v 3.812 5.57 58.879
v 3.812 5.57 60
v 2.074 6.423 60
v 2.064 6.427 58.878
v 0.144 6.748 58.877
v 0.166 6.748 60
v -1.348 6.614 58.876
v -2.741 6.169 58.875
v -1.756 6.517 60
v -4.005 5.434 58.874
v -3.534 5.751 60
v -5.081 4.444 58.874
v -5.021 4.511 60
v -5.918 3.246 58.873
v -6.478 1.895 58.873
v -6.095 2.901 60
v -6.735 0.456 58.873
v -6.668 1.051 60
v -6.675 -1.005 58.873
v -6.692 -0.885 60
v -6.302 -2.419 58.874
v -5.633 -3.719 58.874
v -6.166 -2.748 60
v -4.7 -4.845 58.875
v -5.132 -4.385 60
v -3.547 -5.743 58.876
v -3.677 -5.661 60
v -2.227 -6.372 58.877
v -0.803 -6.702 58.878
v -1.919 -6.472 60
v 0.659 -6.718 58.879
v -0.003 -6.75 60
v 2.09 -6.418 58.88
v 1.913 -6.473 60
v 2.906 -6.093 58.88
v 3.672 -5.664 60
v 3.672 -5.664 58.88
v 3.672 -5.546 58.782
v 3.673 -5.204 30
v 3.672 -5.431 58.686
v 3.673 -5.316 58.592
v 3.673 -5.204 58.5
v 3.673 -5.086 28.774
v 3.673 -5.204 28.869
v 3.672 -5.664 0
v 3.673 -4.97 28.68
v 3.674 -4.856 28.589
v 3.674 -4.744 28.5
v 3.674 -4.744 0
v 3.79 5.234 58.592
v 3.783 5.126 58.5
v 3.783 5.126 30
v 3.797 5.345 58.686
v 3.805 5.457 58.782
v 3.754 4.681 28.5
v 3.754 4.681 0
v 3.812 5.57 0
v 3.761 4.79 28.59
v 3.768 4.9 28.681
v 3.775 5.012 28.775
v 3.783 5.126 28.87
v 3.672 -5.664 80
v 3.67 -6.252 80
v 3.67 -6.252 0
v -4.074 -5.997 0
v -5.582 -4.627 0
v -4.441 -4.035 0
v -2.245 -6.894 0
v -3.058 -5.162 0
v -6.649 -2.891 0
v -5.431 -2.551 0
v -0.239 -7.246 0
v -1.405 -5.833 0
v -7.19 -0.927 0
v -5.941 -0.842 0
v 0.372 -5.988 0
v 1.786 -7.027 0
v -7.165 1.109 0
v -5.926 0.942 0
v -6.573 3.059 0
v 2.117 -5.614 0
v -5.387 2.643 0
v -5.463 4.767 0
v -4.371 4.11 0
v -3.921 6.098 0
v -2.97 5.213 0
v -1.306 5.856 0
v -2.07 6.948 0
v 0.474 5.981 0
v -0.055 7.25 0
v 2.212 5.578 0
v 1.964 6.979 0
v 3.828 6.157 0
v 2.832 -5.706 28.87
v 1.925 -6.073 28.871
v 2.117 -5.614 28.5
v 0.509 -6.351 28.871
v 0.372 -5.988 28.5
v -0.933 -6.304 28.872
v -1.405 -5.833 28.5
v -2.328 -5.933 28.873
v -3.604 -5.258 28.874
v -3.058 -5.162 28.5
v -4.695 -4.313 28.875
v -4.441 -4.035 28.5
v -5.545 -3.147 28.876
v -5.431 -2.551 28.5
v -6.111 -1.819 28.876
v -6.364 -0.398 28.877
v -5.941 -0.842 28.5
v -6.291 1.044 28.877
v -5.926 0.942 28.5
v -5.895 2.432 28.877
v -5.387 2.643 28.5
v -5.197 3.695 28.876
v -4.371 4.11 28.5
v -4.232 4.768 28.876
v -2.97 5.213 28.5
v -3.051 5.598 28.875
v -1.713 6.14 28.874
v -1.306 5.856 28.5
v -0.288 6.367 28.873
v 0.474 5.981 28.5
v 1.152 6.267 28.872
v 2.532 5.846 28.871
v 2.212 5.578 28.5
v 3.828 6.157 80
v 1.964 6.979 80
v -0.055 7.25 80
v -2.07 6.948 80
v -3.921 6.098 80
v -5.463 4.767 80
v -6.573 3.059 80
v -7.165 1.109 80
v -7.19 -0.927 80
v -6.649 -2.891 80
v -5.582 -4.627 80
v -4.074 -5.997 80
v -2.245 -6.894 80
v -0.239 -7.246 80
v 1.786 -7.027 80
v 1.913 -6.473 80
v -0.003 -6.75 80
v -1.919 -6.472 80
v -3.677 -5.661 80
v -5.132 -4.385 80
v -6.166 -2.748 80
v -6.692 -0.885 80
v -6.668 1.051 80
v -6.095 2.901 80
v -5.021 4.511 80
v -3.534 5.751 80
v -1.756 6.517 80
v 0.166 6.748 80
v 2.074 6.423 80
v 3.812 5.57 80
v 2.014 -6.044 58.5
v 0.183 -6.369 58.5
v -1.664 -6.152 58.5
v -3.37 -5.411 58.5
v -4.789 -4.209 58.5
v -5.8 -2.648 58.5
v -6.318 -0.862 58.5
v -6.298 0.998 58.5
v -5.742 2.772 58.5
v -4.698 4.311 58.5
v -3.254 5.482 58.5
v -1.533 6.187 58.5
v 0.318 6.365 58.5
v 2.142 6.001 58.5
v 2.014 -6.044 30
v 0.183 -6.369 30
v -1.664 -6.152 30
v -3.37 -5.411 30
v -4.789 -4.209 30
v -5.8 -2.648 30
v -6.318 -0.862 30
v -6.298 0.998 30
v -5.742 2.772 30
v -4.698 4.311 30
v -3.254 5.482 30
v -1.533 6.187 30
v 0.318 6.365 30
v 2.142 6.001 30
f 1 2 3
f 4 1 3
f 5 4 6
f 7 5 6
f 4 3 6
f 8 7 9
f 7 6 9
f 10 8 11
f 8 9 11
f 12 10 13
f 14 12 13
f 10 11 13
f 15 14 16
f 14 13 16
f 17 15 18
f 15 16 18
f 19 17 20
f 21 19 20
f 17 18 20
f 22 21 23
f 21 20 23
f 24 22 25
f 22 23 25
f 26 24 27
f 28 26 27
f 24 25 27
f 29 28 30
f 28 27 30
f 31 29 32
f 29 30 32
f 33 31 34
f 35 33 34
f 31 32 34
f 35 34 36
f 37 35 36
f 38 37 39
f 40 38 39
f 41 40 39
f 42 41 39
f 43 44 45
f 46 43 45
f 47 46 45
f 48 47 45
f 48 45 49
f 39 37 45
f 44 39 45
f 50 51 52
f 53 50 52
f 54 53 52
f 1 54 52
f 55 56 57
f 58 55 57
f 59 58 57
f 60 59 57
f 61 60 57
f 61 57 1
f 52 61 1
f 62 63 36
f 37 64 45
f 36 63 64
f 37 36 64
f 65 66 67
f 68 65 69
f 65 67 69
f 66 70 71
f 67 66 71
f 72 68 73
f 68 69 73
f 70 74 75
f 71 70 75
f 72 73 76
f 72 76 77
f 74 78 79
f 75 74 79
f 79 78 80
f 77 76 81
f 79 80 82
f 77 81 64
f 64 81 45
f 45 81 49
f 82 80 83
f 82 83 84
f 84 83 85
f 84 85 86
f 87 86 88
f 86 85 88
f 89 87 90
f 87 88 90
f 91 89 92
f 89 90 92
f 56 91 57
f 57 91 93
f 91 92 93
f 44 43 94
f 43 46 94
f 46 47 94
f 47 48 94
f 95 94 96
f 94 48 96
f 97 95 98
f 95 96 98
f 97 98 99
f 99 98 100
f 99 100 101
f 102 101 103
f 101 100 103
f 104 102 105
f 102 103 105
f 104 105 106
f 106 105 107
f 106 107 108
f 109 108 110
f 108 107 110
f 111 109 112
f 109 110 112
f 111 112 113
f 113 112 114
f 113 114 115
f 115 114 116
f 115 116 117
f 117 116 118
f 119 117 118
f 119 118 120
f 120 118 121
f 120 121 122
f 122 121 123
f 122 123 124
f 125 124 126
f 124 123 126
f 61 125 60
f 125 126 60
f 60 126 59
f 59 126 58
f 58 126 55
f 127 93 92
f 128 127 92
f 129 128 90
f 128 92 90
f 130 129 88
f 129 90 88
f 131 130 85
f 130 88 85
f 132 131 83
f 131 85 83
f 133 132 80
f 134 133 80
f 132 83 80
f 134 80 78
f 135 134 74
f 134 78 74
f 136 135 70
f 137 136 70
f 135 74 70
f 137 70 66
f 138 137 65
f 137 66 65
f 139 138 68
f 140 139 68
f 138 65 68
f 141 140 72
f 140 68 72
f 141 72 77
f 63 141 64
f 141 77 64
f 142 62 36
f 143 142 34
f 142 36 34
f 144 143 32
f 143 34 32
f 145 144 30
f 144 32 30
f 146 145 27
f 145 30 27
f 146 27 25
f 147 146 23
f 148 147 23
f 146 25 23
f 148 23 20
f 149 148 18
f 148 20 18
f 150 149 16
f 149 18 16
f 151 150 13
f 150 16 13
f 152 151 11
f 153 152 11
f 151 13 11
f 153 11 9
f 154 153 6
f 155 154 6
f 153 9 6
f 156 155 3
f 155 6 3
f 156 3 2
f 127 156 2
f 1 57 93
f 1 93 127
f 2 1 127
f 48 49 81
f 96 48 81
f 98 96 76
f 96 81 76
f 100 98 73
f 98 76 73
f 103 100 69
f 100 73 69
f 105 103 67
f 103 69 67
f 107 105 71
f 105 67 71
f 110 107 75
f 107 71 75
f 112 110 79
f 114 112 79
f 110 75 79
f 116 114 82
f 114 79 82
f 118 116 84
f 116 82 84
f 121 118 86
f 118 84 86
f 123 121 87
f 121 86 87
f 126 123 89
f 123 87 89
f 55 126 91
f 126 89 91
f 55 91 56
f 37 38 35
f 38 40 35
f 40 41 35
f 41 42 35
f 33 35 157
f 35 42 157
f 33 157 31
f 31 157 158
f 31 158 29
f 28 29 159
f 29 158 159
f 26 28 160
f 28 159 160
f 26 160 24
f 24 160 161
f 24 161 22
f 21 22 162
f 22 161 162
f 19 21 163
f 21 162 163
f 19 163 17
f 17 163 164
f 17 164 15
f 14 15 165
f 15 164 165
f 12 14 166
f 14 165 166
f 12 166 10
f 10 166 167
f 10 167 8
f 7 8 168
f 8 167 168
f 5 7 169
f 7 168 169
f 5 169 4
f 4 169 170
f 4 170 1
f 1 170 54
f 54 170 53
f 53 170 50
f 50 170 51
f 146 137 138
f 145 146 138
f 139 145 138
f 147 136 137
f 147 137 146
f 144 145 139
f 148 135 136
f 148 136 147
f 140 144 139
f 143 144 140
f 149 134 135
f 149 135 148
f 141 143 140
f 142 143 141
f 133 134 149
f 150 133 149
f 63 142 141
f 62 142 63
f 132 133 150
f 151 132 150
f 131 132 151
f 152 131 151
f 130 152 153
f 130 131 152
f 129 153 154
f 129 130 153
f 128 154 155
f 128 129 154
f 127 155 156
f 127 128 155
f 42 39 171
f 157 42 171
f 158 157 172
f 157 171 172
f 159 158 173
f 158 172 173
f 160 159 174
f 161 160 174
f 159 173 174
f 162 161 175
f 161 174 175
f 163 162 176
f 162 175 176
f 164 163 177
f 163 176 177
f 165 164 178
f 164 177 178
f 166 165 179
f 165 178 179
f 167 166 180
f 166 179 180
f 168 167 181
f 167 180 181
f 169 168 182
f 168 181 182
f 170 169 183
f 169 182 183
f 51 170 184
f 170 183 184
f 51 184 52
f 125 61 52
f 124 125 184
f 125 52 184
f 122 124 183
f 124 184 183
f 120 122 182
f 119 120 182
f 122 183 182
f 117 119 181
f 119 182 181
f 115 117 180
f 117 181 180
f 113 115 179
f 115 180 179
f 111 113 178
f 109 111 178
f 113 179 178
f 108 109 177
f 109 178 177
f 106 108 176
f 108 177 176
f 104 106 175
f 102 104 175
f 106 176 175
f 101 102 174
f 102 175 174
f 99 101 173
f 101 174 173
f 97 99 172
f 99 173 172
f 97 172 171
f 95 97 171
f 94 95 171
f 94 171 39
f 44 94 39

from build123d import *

# Parameters (mm, degrees)
F1_DEPTH     = 80
F2_DEPTH     = 60
F3_DEPTH     = 30
F4_T4_ANGLE  = 321.2915133738
F4_S5_R      = 6.75
F4_T6_DEPTH  = 13
F4_T10_ANGLE = 330.397154177
F4_S11_R     = 6.3724602388
F4_T12_DEPTH = 12


# Not quite as in the source:
# - a fillet or chamfer that OpenCascade refuses, or shapes differently, is made with other operations: its cross-section is extruded or revolved along the edge and cut away or added


with BuildPart() as f1:
    # F0 (on Top) → F1 (new body)
    with BuildSketch(Plane.XY):
        with BuildLine():
            ThreePointArc((3.6719317522, -5.6638694553), (-6.7494746232, 0.0842158591), (3.8121072666, 5.5704881463))
            Line((3.8121072666, 5.5704881463), (3.8276649179, 6.1572300003))
            ThreePointArc((3.8276649179, 6.1572300003), (-7.2494177613, 0.091881022), (3.6703837587, -6.2522622357))
            Line((3.6703837587, -6.2522622357), (3.6719317522, -5.6638694553))
        make_face()
    extrude(amount=F1_DEPTH)

    # F0 (on Top) → F2 (join)
    with BuildSketch(Plane.XY):
        with BuildLine():
            Line((3.7829003883, 5.1256385395), (3.8121072666, 5.5704881463))
            ThreePointArc((3.8121072666, 5.5704881463), (-6.7494746232, 0.0842158591), (3.6719317522, -5.6638694553))
            Line((3.6719317522, -5.6638694553), (3.6728513037, -5.2038225677))
            ThreePointArc((3.6728513037, -5.2038225677), (-6.3764069894, 0.0685580429), (3.7829003883, 5.1256385395))
        make_face()
    extrude(amount=F2_DEPTH)

    # F0 (on Top) → F3 (join)
    with BuildSketch(Plane.XY):
        with BuildLine():
            Line((3.75369351, 4.6807889327), (3.7829003883, 5.1256385395))
            ThreePointArc((3.7829003883, 5.1256385395), (-6.3764069894, 0.0685580429), (3.6728513037, -5.2038225677))
            Line((3.6728513037, -5.2038225677), (3.6737708552, -4.7437756801))
            ThreePointArc((3.6737708552, -4.7437756801), (-5.9997842678, 0.0508796647), (3.75369351, 4.6807889327))
        make_face()
    extrude(amount=F3_DEPTH)

    # F4: chamfer of 1.5 on 2 edges, made by hand


with BuildPart() as f4_tool2:
    # F4_s3 → F4_t4 (revolve)
    with BuildSketch(Plane(origin=(-0.0002871576, -0.0007904765, 0), x_dir=(0, 0, 1), z_dir=(0.341440213, 0.9399034955, 0))):
        Polygon((60, 7.8681819087), (58.5, 6.3681819087), (60, 6.3681819087), align=None)
    revolve(axis=Axis((-0.004308375, 0.0006703174, 60), (0, 0, -1)), revolution_arc=F4_T4_ANGLE)

    # F4_s5 → F4_t6 (intersect, symmetric)
    with BuildSketch(Plane.XY.offset(59.2)):
        Circle(F4_S5_R)
    extrude(amount=F4_T6_DEPTH, both=True, mode=Mode.INTERSECT)


with BuildPart() as f1_1:
    add(f1.part)

    # F4_t1: cut F4_tool2
    add(f4_tool2.part, mode=Mode.SUBTRACT)


with BuildPart() as f4_tool8:
    # F4_s9 → F4_t10 (revolve)
    with BuildSketch(Plane(origin=(0, 0, 0), x_dir=(0, 0, 1), z_dir=(0.2636591374, 0.9646159128, 0))):
        Polygon((30, 7.5), (28.5, 6), (30, 6), align=None)
    revolve(axis=Axis((0, 0, 30), (0, 0, -1)), revolution_arc=F4_T10_ANGLE)

    # F4_s11 → F4_t12 (intersect, symmetric)
    with BuildSketch(Plane.XY.offset(29.2)):
        with Locations((-0.004308375, 0.0006703174)):
            Circle(F4_S11_R)
    extrude(amount=F4_T12_DEPTH, both=True, mode=Mode.INTERSECT)


with BuildPart() as f1_2:
    add(f1_1.part)

    # F4_t7: cut F4_tool8
    add(f4_tool8.part, mode=Mode.SUBTRACT)


solid = f1_2.part
